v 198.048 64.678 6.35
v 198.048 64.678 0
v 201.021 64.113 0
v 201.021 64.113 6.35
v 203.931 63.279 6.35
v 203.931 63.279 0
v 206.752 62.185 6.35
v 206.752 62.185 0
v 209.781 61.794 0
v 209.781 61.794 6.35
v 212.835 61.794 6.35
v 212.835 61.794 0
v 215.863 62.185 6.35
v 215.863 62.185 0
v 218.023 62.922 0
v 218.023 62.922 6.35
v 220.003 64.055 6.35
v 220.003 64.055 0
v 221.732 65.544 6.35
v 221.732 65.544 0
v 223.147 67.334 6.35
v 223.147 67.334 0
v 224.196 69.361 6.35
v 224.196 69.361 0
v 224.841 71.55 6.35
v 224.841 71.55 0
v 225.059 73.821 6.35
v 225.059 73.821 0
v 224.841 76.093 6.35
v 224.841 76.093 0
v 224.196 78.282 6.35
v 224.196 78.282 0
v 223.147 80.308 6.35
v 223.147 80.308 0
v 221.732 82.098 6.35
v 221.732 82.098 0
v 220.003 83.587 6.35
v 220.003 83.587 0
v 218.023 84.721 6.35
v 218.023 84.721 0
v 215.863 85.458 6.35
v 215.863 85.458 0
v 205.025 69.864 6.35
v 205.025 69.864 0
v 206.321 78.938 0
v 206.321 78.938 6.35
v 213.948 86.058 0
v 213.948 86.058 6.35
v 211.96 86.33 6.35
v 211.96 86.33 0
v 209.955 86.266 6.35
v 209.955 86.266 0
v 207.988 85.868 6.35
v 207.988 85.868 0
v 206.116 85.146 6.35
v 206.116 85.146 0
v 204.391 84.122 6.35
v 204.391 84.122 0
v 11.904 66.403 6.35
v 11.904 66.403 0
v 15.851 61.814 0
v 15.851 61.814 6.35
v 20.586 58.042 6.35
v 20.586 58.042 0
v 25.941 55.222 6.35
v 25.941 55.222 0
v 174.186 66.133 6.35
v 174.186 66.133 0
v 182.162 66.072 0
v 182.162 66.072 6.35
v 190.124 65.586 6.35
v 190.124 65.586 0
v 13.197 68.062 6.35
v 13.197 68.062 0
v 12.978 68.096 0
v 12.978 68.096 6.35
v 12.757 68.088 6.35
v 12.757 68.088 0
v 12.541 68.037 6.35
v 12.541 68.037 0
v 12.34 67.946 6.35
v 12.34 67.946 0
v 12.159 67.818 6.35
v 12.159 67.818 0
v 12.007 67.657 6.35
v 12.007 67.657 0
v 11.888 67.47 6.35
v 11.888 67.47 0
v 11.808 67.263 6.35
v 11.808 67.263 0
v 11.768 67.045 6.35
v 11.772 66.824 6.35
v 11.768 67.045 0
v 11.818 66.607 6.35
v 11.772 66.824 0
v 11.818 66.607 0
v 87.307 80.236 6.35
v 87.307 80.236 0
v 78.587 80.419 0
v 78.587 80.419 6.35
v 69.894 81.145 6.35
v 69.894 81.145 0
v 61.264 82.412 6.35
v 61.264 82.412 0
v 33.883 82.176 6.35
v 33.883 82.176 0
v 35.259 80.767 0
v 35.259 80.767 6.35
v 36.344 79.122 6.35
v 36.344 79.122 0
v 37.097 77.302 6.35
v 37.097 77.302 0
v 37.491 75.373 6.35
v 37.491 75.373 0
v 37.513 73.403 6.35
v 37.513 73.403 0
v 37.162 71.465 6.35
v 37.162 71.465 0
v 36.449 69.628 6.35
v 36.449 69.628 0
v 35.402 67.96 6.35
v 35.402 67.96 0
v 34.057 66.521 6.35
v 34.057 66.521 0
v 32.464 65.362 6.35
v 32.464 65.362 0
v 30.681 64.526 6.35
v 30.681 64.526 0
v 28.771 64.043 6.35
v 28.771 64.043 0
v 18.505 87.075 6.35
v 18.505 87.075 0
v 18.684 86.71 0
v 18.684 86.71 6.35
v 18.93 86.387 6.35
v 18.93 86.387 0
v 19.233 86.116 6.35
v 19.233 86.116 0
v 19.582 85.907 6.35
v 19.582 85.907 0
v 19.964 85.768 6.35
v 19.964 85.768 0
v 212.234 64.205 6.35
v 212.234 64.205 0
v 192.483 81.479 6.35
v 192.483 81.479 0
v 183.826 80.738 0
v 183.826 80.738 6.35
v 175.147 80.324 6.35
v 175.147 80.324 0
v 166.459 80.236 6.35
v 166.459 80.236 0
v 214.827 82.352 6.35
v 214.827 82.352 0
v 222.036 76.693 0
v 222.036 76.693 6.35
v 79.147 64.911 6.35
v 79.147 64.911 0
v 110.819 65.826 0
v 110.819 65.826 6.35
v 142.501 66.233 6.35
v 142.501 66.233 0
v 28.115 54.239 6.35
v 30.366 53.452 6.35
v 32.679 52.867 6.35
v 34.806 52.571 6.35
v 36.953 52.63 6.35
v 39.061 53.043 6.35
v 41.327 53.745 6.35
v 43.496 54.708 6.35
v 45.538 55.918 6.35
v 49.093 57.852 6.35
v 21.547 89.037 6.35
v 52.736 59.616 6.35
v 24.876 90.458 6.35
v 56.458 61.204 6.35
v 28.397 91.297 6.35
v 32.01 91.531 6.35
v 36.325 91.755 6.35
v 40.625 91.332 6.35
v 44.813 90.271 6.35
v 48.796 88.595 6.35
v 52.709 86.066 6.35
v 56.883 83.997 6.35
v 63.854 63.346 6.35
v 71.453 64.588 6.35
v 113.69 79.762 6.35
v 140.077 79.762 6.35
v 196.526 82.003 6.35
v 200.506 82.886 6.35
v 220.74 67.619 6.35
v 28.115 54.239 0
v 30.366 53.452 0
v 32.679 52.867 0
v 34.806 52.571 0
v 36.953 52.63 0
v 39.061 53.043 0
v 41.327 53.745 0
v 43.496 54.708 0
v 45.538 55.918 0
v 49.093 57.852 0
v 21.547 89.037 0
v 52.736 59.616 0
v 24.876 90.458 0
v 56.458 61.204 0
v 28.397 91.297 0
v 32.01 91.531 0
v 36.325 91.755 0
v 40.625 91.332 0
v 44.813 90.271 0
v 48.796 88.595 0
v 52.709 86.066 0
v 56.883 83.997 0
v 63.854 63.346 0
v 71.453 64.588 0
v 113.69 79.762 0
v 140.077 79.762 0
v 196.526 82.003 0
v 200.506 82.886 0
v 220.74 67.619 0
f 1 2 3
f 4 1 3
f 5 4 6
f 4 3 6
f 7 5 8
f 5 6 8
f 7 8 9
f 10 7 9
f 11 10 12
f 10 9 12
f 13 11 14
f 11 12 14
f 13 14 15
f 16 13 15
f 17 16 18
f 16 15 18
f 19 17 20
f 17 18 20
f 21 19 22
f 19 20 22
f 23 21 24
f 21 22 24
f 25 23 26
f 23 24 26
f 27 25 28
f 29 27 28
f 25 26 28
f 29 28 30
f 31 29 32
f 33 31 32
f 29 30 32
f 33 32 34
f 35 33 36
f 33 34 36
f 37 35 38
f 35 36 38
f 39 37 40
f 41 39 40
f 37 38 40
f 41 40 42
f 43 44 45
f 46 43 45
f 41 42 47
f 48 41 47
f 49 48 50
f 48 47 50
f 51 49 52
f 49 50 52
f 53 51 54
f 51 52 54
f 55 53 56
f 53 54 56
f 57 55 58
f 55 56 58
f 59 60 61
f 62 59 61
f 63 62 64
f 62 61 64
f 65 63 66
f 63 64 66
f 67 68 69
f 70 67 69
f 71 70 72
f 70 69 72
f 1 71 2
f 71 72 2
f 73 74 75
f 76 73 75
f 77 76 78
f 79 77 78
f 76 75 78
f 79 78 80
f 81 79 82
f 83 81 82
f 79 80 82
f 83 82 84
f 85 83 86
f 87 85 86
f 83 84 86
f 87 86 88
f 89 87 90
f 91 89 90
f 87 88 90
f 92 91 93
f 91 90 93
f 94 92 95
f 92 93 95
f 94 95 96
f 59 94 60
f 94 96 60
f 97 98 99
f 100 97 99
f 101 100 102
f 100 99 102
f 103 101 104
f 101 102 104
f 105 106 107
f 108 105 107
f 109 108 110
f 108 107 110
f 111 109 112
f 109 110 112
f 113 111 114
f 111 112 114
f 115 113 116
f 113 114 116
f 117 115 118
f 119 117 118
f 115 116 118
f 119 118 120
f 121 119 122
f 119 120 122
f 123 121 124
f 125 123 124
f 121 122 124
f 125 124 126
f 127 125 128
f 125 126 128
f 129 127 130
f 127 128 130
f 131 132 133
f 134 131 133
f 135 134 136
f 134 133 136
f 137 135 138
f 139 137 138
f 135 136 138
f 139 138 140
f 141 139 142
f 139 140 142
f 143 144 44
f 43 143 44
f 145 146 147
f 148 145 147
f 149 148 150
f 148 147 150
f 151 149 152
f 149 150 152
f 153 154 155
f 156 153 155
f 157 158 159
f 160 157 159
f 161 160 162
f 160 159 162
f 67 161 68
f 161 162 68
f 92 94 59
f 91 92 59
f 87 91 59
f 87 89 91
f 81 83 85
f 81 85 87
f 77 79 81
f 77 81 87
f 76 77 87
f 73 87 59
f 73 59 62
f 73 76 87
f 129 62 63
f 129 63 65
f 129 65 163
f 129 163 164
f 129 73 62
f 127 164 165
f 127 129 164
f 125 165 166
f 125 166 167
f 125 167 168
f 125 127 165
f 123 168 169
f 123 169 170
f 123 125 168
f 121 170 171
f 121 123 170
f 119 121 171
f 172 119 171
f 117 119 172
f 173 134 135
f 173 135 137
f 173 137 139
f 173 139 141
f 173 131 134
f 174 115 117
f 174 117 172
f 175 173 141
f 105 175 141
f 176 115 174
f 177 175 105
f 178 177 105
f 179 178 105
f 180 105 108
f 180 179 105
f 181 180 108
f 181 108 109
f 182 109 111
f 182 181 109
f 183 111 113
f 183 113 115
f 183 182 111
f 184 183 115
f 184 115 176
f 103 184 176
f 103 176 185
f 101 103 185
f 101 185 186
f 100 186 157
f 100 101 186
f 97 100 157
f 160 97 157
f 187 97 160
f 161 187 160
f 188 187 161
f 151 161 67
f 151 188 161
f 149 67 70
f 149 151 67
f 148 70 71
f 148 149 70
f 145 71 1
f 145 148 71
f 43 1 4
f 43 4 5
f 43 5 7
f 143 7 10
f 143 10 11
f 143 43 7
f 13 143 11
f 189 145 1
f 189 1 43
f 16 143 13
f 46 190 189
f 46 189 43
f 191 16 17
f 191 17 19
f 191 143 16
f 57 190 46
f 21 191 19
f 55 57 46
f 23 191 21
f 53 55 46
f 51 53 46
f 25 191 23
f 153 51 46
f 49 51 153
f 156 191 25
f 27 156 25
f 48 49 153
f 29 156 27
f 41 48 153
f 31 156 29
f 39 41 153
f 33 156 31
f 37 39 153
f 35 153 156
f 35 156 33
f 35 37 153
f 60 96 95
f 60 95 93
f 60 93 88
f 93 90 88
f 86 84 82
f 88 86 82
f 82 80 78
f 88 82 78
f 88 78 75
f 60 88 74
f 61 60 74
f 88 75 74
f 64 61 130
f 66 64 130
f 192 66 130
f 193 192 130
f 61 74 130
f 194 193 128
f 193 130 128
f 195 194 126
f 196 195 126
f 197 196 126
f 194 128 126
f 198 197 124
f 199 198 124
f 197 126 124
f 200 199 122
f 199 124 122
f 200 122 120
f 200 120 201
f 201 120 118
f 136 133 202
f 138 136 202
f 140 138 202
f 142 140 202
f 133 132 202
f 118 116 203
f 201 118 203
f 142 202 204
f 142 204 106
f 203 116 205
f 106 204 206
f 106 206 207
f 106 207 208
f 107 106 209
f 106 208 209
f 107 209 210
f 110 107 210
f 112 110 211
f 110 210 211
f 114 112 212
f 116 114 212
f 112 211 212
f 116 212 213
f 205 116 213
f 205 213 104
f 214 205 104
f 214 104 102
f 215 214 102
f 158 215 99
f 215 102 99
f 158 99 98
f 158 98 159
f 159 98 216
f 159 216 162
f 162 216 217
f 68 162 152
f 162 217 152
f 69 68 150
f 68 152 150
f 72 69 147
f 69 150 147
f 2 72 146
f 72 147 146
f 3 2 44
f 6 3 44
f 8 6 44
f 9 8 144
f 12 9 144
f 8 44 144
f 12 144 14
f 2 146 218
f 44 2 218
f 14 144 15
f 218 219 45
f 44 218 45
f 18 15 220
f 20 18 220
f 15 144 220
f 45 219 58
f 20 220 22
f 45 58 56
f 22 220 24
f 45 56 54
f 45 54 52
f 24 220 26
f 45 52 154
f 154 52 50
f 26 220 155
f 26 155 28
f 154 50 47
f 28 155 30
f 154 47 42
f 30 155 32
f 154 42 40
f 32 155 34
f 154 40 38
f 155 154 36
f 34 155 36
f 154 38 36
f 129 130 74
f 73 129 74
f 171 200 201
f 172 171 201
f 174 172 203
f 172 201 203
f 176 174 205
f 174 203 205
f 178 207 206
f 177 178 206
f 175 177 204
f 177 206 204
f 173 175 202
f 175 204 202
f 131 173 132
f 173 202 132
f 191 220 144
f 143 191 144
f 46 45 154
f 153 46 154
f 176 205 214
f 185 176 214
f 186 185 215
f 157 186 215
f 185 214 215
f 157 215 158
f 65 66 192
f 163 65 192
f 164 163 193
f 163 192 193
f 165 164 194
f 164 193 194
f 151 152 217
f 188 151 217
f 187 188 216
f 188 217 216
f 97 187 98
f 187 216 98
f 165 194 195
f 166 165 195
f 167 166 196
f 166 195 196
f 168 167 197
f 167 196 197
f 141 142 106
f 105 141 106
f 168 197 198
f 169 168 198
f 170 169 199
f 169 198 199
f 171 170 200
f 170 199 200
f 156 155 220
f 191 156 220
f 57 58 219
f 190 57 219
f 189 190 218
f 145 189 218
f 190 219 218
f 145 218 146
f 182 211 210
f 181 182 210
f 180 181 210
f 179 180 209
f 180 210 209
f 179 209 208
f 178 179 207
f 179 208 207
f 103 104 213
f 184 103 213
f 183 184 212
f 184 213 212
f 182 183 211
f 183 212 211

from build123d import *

# Parameters (mm, degrees)
F1_DEPTH = 6.35


with BuildPart() as f1:
    # F0 (on Top) → F1 (new body)
    with BuildSketch(Plane.XY):
        with BuildLine():
            Line((19.963766, 85.768253), (33.883162, 82.176149))
            ThreePointArc((33.883162, 82.176149), (37.161542, 71.464828), (28.771324, 64.042941))
            Line((28.771324, 64.042941), (13.19727, 68.062053))
            ThreePointArc((13.19727, 68.062053), (12.006678, 67.656763), (11.904457, 66.40324))
            ThreePointArc((11.904457, 66.40324), (18.129663, 59.81659), (25.941388, 55.221581))
            ThreePointArc((25.941388, 55.221581), (29.231866, 53.820261), (32.679028, 52.867364))
            ThreePointArc((32.679028, 52.867364), (35.880834, 52.556283), (39.06069, 53.042952))
            ThreePointArc((39.06069, 53.042952), (42.426036, 54.19472), (45.53752, 55.918317))
            ThreePointArc((45.53752, 55.918317), (50.903851, 58.755448), (56.458104, 61.204344))
            ThreePointArc((56.458104, 61.204344), (67.635189, 64.081109), (79.146661, 64.911172))
            ThreePointArc((79.146661, 64.911172), (126.658925, 66.093141), (174.185872, 66.132732))
            ThreePointArc((174.185872, 66.132732), (186.146195, 65.881821), (198.048443, 64.678162))
            ThreePointArc((198.048443, 64.678162), (202.485624, 63.728994), (206.752375, 62.184863))
            ThreePointArc((206.752375, 62.184863), (211.307712, 61.74472), (215.863049, 62.184863))
            ThreePointArc((215.863049, 62.184863), (225.059158, 73.821235), (215.863049, 85.457608))
            ThreePointArc((215.863049, 85.457608), (209.954904, 86.266057), (204.390645, 84.121577))
            ThreePointArc((204.390645, 84.121577), (198.525451, 82.399766), (192.482561, 81.478566))
            ThreePointArc((192.482561, 81.478566), (179.488338, 80.490153), (166.459054, 80.236152))
            ThreePointArc((166.459054, 80.236152), (126.883138, 79.702526), (87.307222, 80.236152))
            ThreePointArc((87.307222, 80.236152), (74.234888, 80.714226), (61.264478, 82.412139))
            ThreePointArc((61.264478, 82.412139), (54.766841, 84.972477), (48.795737, 88.594705))
            ThreePointArc((48.795737, 88.594705), (40.624685, 91.332134), (32.009568, 91.530554))
            ThreePointArc((32.009568, 91.530554), (24.876071, 90.45768), (18.504644, 87.074965))
            ThreePointArc((18.504644, 87.074965), (19.075081, 86.243925), (19.963766, 85.768253))
        make_face()
        Polygon((214.82671, 82.351932), (222.036342, 76.692745), (220.740158, 67.619426), (212.234342, 64.205295), (205.024709, 69.864482), (206.320893, 78.937801), align=None, mode=Mode.SUBTRACT)
    extrude(amount=F1_DEPTH)


solid = f1.part
